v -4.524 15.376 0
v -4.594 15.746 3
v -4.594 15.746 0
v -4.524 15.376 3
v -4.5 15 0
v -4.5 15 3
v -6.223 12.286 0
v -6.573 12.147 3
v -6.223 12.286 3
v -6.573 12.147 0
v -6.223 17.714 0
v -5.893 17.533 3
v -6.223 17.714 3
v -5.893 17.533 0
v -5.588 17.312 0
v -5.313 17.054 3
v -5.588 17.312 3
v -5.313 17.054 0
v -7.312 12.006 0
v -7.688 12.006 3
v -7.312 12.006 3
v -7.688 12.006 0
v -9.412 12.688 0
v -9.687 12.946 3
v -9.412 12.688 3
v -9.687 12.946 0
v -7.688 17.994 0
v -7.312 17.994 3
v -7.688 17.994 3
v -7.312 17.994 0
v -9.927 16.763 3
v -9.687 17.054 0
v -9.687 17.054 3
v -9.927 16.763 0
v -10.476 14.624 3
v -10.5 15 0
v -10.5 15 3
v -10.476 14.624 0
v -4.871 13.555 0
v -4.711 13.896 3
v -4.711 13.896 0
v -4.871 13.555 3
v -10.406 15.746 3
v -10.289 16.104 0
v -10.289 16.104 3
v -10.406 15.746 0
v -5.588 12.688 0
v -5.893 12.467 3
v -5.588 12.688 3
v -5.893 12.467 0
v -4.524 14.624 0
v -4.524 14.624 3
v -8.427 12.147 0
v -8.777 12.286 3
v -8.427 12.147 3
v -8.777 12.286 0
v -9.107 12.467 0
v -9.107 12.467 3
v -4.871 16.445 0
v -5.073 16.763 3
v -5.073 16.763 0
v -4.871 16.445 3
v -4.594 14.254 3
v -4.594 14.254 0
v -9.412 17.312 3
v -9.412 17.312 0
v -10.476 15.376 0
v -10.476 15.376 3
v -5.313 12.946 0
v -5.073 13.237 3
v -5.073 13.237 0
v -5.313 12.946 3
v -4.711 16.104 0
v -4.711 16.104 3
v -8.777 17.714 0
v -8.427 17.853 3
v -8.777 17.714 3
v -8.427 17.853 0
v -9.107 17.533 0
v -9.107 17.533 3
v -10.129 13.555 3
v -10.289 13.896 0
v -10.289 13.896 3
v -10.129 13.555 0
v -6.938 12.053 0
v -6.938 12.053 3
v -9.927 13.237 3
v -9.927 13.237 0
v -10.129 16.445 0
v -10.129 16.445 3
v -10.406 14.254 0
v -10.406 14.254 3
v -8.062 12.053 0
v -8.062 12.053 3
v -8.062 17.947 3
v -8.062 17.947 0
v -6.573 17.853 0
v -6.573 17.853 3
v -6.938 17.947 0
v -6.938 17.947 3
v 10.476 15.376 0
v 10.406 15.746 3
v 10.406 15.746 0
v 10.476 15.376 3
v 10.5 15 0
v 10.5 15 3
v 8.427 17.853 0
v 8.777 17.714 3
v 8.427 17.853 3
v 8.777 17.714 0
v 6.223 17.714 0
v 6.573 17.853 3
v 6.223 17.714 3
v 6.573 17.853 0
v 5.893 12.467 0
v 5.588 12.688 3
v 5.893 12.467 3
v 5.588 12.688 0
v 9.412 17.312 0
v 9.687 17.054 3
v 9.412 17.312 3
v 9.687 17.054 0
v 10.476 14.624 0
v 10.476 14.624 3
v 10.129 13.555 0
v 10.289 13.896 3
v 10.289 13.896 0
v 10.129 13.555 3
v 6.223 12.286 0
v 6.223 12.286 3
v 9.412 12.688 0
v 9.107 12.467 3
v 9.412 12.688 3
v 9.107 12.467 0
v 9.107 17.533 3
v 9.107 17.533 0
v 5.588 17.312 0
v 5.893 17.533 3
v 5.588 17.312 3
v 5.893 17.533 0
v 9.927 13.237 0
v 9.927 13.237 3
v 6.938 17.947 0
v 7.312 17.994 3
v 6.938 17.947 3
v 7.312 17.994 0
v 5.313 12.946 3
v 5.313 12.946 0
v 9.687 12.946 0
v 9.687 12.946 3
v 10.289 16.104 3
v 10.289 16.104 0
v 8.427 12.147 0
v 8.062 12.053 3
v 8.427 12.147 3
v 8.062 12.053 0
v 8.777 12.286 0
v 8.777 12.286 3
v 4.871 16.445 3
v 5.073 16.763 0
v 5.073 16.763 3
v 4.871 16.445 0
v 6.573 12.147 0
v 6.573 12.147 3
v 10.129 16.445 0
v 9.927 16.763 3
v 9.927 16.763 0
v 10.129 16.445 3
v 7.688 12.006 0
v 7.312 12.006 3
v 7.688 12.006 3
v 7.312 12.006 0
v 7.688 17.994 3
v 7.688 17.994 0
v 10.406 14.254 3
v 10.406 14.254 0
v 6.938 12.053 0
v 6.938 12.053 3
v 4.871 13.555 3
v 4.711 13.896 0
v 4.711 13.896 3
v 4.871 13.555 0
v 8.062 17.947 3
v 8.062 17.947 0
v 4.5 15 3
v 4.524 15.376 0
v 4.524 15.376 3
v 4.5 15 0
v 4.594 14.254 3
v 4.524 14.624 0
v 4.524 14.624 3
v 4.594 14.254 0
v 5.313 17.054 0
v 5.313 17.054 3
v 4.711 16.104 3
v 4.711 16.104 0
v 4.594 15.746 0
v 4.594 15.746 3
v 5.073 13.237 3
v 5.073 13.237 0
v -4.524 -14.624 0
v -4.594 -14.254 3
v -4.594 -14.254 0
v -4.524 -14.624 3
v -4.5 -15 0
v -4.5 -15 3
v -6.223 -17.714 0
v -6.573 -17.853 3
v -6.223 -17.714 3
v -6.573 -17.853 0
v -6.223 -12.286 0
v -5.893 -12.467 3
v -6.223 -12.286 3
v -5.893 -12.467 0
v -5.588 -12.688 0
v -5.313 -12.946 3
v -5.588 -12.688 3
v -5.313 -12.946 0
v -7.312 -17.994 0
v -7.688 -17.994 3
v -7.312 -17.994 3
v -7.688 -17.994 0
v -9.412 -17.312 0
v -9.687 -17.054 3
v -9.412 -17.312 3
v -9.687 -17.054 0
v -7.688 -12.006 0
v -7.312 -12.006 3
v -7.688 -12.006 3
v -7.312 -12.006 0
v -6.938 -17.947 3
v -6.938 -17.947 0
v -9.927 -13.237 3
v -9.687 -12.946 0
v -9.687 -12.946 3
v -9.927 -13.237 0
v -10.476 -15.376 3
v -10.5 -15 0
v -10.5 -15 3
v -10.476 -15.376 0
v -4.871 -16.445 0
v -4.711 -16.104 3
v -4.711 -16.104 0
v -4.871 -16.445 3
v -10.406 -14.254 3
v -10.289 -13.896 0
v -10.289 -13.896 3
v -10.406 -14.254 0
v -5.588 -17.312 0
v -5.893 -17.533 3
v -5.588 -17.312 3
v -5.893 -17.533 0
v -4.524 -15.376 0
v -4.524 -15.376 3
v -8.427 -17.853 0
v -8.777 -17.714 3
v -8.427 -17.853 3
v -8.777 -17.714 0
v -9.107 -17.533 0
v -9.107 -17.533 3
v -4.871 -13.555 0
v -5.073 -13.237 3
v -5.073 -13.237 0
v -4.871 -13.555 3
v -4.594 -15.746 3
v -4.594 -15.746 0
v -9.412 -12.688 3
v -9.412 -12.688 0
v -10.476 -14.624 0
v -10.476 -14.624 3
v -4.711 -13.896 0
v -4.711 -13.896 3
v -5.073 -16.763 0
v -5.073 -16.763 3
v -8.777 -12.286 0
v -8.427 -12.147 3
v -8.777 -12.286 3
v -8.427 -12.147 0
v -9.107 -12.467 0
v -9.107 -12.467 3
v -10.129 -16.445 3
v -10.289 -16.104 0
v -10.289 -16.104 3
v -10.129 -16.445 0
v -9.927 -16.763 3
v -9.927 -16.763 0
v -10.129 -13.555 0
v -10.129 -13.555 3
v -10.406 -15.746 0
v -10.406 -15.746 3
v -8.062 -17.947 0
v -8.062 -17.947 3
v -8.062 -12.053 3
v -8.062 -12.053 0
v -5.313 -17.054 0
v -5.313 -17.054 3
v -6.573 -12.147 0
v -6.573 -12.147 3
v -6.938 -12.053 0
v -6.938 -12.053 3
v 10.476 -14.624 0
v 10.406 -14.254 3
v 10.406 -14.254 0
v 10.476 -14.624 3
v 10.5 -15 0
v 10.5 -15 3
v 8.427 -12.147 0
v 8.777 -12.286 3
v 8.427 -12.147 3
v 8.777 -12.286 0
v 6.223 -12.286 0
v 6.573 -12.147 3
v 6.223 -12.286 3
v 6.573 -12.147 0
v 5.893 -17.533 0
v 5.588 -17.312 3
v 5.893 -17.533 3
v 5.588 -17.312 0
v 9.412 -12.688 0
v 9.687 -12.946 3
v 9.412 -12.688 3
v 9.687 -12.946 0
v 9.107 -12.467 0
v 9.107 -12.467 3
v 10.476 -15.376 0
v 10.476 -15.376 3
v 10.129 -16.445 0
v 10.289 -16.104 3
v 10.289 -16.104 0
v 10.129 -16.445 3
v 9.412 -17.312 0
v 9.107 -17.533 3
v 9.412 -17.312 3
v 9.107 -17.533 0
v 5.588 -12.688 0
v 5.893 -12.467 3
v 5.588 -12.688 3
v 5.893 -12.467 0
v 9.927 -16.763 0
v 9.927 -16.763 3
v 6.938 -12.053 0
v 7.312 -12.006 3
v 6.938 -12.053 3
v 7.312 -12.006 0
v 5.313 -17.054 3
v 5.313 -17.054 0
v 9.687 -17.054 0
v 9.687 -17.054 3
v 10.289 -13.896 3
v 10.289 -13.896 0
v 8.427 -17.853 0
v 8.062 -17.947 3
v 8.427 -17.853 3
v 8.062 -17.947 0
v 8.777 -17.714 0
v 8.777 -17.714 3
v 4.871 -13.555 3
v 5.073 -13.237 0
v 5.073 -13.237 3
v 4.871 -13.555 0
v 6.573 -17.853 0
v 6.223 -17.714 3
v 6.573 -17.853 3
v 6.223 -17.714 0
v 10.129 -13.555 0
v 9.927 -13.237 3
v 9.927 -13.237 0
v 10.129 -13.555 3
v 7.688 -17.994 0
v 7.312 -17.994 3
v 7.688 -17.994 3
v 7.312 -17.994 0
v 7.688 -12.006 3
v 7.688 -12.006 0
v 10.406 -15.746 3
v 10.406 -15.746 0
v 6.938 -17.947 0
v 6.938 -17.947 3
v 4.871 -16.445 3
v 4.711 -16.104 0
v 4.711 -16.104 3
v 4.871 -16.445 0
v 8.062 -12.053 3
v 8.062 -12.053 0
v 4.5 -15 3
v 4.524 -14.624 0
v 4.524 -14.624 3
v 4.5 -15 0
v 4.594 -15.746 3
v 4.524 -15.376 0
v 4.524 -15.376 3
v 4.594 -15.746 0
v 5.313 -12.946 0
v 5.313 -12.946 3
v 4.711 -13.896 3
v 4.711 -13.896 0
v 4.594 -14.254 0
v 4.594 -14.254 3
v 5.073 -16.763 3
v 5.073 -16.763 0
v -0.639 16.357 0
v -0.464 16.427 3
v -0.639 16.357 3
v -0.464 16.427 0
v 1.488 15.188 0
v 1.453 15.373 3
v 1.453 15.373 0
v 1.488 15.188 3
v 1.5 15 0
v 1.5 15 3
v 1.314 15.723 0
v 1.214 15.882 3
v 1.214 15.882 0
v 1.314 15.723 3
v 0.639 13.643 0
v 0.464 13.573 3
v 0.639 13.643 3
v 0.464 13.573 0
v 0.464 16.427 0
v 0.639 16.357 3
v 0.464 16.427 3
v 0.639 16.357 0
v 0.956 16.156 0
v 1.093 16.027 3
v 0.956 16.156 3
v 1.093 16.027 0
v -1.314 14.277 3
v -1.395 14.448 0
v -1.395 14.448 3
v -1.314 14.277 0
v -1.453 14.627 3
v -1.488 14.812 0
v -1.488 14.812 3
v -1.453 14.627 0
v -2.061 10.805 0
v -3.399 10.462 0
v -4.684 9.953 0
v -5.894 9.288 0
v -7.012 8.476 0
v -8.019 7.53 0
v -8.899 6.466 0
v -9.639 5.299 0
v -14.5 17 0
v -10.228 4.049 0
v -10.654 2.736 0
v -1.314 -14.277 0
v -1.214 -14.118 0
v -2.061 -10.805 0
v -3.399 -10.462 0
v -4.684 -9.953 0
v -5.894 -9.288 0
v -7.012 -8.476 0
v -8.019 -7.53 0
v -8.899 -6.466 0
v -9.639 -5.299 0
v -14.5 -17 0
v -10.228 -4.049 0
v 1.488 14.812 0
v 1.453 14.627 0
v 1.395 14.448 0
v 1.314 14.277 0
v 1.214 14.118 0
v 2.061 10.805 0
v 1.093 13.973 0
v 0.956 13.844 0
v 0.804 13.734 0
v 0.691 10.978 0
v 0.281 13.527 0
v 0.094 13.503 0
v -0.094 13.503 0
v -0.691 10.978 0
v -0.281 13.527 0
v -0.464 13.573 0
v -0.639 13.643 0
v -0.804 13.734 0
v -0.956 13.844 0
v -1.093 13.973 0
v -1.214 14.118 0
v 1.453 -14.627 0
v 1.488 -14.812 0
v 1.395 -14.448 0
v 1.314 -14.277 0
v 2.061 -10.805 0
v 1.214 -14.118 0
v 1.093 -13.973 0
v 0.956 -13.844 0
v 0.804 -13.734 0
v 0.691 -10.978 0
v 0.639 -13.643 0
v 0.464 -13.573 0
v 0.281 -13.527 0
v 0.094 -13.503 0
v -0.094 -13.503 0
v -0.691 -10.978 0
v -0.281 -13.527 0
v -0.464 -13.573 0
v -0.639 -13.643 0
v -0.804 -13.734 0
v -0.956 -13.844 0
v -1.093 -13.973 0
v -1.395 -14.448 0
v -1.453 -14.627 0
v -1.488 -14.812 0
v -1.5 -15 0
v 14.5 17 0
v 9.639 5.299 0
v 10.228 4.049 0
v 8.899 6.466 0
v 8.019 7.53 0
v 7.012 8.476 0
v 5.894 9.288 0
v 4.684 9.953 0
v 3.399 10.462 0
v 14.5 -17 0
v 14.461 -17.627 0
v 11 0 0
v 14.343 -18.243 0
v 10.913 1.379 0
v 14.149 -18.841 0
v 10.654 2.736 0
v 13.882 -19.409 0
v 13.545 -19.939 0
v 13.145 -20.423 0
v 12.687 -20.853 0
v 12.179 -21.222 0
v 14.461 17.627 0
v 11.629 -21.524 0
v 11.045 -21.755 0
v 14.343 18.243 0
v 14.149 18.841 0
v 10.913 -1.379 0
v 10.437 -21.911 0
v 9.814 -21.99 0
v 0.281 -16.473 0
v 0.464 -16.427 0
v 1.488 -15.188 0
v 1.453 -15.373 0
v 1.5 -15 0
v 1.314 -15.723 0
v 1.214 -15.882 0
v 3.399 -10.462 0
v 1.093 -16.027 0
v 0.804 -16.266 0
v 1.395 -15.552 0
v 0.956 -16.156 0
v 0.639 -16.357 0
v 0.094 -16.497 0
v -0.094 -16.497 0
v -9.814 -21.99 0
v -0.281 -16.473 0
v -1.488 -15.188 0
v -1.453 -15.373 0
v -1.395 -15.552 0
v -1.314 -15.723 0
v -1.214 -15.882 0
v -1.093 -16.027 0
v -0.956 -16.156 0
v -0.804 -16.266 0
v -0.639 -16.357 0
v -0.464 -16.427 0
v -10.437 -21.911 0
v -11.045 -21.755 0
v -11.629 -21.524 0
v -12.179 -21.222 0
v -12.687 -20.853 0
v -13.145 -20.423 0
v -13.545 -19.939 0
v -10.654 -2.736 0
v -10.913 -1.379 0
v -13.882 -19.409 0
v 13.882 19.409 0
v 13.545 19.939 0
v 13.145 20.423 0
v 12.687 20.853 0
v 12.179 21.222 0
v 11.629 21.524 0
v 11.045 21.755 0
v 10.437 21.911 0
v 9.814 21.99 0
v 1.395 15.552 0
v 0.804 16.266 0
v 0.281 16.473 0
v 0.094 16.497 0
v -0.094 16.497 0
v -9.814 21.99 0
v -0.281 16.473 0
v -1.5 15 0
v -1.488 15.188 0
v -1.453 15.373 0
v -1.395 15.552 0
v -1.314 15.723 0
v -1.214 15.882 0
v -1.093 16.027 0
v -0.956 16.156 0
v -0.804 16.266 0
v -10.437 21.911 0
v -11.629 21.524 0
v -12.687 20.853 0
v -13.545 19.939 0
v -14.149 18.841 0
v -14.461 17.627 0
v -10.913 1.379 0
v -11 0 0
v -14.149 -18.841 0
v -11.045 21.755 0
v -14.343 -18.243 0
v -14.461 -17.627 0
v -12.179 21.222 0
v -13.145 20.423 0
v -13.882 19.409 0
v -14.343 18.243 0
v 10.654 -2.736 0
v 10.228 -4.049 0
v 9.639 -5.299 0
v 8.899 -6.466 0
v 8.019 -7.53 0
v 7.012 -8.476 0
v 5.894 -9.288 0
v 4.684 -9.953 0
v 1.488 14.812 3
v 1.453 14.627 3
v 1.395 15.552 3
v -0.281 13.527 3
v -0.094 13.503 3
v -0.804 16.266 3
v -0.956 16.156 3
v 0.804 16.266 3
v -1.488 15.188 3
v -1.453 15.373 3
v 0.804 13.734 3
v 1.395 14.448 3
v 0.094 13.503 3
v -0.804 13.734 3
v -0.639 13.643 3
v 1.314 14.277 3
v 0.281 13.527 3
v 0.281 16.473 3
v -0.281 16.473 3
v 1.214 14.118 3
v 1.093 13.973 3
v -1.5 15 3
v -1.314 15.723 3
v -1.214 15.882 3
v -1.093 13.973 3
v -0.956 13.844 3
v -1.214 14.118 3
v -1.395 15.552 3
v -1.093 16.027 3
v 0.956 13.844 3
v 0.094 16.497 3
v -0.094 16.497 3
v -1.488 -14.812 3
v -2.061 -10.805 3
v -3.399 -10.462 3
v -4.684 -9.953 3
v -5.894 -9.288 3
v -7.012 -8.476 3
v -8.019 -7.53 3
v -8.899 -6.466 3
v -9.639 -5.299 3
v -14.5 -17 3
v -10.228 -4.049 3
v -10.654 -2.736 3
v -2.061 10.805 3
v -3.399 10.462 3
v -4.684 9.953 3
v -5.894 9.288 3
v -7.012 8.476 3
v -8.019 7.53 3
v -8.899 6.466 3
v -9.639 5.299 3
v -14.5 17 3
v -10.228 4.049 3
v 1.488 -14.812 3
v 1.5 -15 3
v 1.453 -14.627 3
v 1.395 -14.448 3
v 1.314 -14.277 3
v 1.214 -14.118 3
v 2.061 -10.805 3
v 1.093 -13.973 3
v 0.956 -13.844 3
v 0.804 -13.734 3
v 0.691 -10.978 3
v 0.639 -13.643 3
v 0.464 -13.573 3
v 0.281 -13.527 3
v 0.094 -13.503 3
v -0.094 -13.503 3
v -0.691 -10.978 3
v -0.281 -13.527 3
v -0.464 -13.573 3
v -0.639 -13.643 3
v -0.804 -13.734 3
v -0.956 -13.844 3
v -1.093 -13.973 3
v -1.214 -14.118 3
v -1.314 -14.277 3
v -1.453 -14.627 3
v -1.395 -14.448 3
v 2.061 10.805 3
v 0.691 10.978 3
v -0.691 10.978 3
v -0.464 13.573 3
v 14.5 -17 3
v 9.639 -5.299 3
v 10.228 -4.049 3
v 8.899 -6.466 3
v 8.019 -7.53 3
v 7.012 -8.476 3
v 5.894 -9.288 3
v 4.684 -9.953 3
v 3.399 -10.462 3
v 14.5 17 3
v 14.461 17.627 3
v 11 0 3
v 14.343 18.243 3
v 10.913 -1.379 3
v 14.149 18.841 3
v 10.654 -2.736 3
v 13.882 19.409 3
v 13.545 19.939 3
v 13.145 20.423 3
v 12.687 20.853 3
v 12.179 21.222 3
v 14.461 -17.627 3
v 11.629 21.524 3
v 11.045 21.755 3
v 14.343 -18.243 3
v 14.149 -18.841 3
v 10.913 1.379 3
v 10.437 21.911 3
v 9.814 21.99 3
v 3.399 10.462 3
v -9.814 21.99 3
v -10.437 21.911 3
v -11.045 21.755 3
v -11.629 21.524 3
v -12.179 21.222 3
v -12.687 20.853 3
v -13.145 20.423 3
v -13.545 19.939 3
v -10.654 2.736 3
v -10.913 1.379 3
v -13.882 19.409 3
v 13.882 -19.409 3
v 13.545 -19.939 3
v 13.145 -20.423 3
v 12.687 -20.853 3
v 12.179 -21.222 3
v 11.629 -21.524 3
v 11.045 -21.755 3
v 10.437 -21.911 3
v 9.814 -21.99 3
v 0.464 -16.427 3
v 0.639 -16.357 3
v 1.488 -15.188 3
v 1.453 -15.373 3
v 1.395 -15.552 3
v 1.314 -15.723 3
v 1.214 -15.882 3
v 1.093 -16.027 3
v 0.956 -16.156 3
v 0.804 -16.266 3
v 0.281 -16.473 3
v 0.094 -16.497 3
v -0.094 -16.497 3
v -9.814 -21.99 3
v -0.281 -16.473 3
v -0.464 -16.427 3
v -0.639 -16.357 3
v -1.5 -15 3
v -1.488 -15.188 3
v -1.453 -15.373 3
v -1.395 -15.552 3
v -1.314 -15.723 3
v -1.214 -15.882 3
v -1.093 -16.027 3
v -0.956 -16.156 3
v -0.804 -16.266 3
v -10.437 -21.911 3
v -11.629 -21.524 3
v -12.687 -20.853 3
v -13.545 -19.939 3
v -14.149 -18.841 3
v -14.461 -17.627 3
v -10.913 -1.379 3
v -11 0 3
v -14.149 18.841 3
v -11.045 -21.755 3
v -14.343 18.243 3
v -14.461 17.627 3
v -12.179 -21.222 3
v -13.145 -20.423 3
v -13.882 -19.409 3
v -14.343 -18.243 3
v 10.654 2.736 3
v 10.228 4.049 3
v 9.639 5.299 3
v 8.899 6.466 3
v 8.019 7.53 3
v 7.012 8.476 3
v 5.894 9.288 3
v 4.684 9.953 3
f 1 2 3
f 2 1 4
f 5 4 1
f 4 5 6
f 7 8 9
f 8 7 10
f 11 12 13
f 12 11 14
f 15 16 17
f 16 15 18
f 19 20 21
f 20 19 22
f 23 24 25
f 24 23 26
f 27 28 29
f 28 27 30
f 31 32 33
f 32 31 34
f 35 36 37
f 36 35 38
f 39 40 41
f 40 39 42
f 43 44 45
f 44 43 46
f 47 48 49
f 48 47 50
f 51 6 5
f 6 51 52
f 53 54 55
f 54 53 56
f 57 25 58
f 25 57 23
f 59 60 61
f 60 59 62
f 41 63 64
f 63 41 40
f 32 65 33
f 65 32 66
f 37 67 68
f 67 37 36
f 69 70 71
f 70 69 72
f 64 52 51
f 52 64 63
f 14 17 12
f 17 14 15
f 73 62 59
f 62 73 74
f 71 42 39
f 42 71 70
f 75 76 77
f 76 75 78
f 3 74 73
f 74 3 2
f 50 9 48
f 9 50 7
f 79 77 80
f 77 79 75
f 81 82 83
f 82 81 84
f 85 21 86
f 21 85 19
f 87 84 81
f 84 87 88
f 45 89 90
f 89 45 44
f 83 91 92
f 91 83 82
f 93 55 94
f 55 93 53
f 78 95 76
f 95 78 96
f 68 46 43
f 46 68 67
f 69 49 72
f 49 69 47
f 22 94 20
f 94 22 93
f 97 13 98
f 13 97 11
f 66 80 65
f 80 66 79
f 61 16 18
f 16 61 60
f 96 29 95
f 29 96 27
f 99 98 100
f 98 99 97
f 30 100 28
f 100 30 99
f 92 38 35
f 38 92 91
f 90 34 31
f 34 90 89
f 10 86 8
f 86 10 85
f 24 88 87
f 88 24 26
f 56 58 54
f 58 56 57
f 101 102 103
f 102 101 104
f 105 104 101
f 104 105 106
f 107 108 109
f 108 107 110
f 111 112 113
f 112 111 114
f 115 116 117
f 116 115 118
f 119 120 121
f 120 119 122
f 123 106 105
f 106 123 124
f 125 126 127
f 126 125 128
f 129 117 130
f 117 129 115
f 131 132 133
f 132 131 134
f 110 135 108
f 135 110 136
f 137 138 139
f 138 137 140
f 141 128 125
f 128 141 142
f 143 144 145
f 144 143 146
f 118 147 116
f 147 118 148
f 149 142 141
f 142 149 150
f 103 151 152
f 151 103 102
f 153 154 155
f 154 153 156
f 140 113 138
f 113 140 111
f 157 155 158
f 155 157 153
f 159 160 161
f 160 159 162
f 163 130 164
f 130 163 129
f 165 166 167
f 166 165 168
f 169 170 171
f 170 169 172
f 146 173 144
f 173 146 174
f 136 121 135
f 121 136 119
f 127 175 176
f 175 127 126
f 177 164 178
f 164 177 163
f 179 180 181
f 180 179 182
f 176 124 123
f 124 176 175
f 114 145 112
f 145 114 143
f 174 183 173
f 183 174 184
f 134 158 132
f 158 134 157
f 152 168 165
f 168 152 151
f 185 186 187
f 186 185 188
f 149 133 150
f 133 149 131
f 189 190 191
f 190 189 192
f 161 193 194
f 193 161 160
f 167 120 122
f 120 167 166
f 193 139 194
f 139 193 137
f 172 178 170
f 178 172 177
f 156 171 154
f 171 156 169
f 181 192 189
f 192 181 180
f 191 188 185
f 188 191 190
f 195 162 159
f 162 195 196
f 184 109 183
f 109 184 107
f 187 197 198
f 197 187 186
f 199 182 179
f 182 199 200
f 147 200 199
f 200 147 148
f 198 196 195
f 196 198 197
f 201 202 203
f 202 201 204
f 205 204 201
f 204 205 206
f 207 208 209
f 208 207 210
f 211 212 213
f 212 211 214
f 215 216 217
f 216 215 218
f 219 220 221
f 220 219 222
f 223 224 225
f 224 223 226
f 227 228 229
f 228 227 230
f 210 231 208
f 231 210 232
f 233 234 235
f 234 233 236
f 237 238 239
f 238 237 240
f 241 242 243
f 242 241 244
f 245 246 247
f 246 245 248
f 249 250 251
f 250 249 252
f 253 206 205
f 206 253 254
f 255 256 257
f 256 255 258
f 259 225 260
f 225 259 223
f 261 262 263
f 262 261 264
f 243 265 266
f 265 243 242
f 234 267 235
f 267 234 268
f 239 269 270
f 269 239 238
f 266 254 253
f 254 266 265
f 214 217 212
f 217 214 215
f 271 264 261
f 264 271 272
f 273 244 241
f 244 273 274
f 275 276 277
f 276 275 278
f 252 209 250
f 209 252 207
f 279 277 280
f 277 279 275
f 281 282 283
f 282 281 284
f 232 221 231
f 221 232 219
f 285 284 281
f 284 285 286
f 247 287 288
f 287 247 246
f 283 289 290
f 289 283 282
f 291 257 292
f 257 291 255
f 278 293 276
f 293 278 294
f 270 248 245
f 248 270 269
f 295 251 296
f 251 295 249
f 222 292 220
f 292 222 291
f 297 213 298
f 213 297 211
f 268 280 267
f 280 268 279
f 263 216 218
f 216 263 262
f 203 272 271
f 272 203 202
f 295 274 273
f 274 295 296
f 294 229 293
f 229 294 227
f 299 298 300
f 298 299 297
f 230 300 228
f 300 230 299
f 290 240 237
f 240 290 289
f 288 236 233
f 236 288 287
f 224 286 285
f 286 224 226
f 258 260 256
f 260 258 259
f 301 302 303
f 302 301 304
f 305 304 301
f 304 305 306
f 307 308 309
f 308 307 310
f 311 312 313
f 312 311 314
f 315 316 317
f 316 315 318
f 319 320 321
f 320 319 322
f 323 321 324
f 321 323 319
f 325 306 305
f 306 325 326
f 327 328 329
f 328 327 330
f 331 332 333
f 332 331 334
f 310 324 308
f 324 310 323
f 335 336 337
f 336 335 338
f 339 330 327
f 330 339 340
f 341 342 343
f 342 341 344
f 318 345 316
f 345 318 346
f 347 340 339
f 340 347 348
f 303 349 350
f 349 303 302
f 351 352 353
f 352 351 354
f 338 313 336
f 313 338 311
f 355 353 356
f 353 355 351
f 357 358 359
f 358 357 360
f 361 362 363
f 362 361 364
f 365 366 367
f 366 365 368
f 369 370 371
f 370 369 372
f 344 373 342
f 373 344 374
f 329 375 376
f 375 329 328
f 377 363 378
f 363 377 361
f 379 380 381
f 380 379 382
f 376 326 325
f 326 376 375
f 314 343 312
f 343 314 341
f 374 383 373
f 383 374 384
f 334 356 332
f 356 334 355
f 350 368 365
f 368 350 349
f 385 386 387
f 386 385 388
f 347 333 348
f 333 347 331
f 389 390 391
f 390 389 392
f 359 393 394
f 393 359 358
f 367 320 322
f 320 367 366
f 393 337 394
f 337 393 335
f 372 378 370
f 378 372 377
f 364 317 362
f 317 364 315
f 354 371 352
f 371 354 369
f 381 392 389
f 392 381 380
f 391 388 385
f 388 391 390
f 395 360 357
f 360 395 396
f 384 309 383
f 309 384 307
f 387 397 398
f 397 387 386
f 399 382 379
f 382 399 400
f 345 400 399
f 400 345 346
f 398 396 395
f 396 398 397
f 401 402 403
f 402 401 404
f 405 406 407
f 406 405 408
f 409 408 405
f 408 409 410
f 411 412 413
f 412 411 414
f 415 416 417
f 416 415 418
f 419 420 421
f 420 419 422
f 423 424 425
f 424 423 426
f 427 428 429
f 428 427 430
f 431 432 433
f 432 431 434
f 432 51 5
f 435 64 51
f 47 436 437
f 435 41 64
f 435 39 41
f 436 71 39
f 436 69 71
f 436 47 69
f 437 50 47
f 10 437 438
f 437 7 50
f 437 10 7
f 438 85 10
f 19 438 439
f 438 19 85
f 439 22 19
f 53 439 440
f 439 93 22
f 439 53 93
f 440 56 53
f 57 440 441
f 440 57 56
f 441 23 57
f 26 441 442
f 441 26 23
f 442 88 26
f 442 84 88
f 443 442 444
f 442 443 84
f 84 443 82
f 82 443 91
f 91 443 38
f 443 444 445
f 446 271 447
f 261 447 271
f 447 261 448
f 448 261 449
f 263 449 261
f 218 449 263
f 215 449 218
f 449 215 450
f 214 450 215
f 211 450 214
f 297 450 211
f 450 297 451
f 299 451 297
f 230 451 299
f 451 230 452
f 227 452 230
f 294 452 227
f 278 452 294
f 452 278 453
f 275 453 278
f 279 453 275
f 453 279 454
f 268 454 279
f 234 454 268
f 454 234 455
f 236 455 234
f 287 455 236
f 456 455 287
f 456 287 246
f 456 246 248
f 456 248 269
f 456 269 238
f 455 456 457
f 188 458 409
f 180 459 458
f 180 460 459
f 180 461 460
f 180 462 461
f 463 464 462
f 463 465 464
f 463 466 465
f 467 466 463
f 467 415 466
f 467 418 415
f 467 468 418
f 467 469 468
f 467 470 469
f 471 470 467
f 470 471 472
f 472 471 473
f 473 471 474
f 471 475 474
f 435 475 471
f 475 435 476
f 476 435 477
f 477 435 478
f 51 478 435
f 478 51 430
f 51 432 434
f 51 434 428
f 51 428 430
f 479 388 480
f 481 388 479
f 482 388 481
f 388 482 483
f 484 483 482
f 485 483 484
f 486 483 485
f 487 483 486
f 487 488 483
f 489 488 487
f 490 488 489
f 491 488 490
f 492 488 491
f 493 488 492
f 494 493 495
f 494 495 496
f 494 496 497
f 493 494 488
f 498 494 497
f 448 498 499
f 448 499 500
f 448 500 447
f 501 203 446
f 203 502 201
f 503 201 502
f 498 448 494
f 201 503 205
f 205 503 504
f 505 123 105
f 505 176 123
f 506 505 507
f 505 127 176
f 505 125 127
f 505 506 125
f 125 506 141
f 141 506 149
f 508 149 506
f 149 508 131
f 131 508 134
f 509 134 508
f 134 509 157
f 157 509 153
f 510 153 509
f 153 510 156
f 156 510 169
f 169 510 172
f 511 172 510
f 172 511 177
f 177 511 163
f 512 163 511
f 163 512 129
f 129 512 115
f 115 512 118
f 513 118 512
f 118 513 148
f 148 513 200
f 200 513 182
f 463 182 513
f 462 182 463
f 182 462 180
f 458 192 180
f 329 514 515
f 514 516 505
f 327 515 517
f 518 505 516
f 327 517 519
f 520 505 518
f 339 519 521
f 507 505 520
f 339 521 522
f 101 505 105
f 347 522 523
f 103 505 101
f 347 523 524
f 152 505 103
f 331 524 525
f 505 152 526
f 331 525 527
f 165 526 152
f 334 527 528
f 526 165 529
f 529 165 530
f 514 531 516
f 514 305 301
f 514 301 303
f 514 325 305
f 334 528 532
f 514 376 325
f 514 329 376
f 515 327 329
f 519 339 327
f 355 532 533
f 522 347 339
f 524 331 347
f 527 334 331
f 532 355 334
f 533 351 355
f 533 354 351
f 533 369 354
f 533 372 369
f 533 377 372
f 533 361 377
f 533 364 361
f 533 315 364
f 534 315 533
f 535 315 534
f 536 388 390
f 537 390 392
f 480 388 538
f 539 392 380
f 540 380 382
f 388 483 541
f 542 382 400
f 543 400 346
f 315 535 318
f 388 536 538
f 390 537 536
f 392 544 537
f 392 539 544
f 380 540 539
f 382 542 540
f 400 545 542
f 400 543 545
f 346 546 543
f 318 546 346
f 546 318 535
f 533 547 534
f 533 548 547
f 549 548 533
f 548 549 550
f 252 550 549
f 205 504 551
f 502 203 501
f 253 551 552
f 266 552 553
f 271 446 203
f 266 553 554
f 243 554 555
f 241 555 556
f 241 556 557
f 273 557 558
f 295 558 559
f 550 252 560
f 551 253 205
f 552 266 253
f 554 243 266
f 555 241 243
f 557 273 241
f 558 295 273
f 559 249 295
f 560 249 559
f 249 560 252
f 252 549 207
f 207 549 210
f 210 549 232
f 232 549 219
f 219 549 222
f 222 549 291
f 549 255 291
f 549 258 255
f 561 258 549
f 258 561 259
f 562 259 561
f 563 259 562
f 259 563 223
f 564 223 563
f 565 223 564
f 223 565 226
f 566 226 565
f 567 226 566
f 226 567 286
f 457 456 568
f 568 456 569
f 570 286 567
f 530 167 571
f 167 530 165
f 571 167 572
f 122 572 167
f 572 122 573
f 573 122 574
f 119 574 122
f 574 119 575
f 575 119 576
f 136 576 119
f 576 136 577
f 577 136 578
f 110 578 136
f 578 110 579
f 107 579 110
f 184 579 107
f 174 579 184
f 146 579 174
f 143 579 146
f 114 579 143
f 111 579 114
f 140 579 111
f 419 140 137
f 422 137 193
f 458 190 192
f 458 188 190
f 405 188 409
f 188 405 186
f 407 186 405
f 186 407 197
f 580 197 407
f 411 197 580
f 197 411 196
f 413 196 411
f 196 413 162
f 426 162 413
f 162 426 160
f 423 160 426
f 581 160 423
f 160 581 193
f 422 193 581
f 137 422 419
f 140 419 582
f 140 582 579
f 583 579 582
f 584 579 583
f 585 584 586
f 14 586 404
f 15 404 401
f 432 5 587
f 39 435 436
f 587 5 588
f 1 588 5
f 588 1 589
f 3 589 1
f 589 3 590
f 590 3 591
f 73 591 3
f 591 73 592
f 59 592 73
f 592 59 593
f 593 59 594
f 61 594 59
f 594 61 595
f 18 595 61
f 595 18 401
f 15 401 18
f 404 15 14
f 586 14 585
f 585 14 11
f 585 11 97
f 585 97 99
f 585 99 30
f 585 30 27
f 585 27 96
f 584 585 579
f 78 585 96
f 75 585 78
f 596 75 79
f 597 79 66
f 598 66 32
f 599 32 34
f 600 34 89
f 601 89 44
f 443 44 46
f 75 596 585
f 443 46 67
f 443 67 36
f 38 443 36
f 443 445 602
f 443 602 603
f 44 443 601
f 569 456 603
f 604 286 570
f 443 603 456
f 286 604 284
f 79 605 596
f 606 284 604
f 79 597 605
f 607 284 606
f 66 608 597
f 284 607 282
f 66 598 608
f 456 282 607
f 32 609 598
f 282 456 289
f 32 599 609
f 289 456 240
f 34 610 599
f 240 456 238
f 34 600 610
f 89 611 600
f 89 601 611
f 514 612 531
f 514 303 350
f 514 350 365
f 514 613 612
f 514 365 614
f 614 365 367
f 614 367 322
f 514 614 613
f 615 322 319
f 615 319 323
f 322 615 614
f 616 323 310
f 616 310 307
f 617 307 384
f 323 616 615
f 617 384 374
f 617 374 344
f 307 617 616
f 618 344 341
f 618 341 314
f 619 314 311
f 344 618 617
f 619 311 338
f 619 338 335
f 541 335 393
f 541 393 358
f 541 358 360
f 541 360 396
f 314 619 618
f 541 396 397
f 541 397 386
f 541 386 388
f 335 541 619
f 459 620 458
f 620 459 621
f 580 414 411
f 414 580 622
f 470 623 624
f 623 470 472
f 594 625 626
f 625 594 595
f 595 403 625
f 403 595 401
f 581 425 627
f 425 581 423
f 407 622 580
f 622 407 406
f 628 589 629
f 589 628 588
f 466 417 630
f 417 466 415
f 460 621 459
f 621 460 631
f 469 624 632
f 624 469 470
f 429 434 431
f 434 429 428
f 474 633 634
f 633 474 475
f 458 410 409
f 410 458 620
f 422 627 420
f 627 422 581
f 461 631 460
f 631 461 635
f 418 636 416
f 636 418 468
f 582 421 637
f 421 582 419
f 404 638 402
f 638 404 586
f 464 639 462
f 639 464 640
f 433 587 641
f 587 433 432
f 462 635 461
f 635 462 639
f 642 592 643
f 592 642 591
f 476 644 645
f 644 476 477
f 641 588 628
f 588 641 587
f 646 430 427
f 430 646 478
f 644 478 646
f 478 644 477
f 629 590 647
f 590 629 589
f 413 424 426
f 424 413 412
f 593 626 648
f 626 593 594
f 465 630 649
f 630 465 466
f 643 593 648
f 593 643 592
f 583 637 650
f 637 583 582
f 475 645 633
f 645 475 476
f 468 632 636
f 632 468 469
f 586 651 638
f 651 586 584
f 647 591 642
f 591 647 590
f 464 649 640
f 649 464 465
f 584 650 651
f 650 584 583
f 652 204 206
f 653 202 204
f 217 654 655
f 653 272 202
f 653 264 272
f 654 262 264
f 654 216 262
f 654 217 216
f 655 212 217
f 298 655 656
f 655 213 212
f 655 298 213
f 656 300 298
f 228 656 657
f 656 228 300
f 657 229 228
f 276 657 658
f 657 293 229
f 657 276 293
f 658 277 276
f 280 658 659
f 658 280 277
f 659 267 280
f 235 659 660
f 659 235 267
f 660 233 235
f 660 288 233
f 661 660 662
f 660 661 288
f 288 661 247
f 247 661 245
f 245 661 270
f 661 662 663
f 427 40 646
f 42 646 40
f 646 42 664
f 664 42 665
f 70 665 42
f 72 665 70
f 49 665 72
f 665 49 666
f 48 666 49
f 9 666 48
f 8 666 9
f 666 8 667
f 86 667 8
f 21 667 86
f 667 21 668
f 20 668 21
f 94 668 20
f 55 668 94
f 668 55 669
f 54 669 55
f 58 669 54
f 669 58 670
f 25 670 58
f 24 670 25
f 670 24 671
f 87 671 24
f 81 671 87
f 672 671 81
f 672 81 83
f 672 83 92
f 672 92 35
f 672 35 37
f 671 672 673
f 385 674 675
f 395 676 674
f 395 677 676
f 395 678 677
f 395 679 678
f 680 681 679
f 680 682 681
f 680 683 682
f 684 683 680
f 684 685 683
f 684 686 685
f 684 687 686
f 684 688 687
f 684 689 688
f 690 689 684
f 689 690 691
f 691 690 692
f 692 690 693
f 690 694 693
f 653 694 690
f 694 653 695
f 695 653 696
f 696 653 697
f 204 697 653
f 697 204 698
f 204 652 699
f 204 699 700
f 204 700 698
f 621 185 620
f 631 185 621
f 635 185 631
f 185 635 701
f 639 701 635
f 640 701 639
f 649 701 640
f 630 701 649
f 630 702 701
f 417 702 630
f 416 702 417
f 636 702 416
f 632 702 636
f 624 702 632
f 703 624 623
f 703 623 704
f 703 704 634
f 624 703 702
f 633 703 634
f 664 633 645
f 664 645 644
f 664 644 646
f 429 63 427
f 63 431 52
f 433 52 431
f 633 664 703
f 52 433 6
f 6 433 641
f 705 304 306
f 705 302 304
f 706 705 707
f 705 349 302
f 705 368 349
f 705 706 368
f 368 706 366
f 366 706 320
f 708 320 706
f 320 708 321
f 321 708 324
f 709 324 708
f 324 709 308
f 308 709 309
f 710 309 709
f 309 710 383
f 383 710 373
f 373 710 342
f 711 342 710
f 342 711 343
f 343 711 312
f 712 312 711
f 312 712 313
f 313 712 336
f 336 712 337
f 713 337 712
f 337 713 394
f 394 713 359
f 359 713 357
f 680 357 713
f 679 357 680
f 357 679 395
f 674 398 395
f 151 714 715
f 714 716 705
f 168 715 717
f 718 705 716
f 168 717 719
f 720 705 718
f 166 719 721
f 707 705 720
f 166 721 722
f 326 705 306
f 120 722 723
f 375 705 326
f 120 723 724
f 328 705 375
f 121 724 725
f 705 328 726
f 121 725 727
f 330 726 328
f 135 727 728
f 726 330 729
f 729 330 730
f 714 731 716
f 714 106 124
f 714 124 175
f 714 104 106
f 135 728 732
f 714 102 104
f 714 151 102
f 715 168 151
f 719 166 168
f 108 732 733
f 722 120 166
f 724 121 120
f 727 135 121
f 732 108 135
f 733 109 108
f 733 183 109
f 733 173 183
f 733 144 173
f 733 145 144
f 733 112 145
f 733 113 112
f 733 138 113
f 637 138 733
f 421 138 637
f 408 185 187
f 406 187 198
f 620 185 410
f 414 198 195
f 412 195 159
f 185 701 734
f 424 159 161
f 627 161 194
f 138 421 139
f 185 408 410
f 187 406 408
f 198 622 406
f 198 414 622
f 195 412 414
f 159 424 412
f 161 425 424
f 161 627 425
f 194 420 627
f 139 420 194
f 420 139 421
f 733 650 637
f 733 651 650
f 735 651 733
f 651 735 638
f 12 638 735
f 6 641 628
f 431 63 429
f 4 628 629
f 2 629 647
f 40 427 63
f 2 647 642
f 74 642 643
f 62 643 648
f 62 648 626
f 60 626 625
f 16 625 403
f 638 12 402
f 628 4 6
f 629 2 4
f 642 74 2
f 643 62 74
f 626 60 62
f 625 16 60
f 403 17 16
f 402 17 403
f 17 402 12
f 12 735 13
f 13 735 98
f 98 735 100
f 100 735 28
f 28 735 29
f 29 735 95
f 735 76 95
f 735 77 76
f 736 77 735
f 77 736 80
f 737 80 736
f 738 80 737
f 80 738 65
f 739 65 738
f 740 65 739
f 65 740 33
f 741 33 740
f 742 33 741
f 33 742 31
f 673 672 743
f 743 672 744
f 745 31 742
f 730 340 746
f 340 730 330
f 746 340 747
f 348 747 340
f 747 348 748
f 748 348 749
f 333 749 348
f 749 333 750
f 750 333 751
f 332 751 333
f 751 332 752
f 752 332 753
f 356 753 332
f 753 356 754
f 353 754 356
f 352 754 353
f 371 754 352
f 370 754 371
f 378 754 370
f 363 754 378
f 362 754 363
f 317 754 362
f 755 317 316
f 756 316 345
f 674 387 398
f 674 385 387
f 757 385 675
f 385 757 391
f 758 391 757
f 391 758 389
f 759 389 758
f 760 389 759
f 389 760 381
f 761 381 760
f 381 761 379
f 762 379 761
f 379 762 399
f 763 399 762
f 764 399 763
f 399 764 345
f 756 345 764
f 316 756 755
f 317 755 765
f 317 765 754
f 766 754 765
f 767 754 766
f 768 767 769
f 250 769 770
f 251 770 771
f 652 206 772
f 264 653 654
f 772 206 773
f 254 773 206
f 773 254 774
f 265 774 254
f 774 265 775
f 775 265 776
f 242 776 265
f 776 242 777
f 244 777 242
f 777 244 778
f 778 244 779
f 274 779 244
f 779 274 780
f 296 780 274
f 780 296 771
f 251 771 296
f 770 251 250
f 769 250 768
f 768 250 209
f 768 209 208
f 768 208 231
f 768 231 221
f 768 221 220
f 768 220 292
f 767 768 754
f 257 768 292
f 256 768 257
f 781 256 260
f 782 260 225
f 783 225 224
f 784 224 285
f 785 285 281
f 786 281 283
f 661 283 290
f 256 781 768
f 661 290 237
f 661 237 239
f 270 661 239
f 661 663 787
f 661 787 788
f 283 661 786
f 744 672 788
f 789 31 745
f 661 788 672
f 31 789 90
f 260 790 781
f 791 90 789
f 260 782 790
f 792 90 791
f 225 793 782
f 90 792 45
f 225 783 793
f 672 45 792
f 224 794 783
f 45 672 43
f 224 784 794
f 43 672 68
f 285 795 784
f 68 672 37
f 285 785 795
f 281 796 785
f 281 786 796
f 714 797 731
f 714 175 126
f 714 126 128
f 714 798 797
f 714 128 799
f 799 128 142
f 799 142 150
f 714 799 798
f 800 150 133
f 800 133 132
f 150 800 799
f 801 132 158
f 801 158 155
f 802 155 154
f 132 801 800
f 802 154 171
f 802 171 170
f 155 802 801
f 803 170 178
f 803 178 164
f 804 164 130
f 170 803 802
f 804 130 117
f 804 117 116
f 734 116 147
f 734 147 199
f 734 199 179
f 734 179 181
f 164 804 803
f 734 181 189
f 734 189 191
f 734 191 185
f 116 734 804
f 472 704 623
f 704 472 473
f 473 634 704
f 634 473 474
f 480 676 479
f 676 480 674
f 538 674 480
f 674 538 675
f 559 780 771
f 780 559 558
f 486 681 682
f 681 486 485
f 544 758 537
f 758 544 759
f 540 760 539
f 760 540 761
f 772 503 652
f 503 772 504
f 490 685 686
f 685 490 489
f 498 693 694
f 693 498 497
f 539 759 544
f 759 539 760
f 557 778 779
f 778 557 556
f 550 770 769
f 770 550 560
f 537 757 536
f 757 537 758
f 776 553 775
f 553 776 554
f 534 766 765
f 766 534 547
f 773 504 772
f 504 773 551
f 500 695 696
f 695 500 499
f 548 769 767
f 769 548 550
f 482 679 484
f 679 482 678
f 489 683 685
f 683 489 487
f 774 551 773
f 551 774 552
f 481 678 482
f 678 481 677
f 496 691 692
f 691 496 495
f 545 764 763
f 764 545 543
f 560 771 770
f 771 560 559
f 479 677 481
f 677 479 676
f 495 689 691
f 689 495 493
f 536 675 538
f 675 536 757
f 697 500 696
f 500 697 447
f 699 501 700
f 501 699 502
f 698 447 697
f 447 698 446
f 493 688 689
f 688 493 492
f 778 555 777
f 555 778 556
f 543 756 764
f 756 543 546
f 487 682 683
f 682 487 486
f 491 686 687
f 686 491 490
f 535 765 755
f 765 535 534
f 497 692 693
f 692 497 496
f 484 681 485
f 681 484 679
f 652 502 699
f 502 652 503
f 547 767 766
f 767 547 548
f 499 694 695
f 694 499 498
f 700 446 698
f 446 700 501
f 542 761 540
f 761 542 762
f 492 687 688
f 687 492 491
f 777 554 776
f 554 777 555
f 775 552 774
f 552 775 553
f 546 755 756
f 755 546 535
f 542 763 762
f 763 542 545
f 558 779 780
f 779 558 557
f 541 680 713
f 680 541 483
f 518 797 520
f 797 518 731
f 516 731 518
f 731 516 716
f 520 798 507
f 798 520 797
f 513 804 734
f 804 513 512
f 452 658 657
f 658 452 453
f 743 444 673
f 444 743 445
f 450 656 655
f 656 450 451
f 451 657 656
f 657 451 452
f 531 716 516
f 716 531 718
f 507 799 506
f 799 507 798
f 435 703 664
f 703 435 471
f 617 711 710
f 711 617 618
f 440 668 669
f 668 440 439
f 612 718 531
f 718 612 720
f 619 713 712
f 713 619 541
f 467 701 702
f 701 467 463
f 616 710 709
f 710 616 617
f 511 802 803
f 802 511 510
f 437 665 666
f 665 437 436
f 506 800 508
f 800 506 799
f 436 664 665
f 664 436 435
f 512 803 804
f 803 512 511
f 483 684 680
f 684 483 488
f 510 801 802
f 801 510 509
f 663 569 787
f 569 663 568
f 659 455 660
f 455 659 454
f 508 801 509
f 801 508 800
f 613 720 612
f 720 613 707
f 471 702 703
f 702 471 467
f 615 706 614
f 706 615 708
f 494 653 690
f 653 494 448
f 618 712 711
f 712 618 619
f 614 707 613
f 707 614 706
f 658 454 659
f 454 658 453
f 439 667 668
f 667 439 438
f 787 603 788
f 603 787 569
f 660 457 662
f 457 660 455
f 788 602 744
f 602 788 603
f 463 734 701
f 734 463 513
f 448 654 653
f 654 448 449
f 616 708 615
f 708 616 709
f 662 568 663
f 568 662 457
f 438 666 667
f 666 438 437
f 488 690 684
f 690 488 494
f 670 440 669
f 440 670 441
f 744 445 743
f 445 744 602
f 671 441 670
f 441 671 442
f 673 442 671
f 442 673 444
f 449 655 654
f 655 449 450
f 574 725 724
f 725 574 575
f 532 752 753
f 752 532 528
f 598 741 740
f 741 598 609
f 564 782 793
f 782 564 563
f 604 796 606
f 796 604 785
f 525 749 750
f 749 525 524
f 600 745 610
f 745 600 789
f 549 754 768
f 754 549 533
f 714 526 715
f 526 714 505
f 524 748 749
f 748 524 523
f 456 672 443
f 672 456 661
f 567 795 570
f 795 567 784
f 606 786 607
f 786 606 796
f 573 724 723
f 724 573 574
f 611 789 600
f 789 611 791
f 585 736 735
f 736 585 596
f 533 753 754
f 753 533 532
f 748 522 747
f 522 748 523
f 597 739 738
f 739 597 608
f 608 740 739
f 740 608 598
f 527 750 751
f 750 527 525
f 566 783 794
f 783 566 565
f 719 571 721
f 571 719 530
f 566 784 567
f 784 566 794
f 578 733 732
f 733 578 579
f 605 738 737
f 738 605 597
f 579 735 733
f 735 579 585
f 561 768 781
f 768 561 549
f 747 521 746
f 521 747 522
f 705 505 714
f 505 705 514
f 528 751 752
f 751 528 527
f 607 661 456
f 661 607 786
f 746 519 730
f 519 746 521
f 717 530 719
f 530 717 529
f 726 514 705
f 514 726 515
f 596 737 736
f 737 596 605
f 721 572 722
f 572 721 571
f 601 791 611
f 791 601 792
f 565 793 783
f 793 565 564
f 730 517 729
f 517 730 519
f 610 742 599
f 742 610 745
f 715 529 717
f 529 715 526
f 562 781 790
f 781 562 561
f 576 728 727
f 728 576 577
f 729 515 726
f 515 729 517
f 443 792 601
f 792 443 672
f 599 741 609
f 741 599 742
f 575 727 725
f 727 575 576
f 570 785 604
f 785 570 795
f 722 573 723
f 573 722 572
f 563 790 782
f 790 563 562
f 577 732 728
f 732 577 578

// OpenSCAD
$fn = 50;


difference() {
	union() {
		hull() {
			translate(v = [-9.5000000000, 17.0000000000, 0]) {
				cylinder(h = 3, r = 5);
			}
			translate(v = [9.5000000000, 17.0000000000, 0]) {
				cylinder(h = 3, r = 5);
			}
			translate(v = [-9.5000000000, -17.0000000000, 0]) {
				cylinder(h = 3, r = 5);
			}
			translate(v = [9.5000000000, -17.0000000000, 0]) {
				cylinder(h = 3, r = 5);
			}
		}
	}
	union() {
		#translate(v = [-7.5000000000, 15.0000000000, 0]) {
			cylinder(h = 3, r = 3.0000000000);
		}
		#translate(v = [7.5000000000, 15.0000000000, 0]) {
			cylinder(h = 3, r = 3.0000000000);
		}
		#translate(v = [-7.5000000000, -15.0000000000, 0]) {
			cylinder(h = 3, r = 3.0000000000);
		}
		#translate(v = [7.5000000000, -15.0000000000, 0]) {
			cylinder(h = 3, r = 3.0000000000);
		}
		#translate(v = [-7.5000000000, -15.0000000000, -100.0000000000]) {
			cylinder(h = 200, r = 3.0000000000);
		}
		#translate(v = [-7.5000000000, 15.0000000000, -100.0000000000]) {
			cylinder(h = 200, r = 3.0000000000);
		}
		#translate(v = [7.5000000000, -15.0000000000, -100.0000000000]) {
			cylinder(h = 200, r = 3.0000000000);
		}
		#translate(v = [7.5000000000, 15.0000000000, -100.0000000000]) {
			cylinder(h = 200, r = 3.0000000000);
		}
		#translate(v = [-7.5000000000, 15.0000000000, 0]) {
			cylinder(h = 3, r = 1.5000000000);
		}
		#translate(v = [0.0000000000, 15.0000000000, 0]) {
			cylinder(h = 3, r = 1.5000000000);
		}
		#translate(v = [7.5000000000, 15.0000000000, 0]) {
			cylinder(h = 3, r = 1.5000000000);
		}
		#translate(v = [-7.5000000000, -15.0000000000, 0]) {
			cylinder(h = 3, r = 1.5000000000);
		}
		#translate(v = [0.0000000000, -15.0000000000, 0]) {
			cylinder(h = 3, r = 1.5000000000);
		}
		#translate(v = [7.5000000000, -15.0000000000, 0]) {
			cylinder(h = 3, r = 1.5000000000);
		}
		#translate(v = [-7.5000000000, 15.0000000000, 0]) {
			cylinder(h = 3, r = 1.5000000000);
		}
		#translate(v = [0.0000000000, 15.0000000000, 0]) {
			cylinder(h = 3, r = 1.5000000000);
		}
		#translate(v = [7.5000000000, 15.0000000000, 0]) {
			cylinder(h = 3, r = 1.5000000000);
		}
		#translate(v = [-7.5000000000, -15.0000000000, 0]) {
			cylinder(h = 3, r = 1.5000000000);
		}
		#translate(v = [0.0000000000, -15.0000000000, 0]) {
			cylinder(h = 3, r = 1.5000000000);
		}
		#translate(v = [7.5000000000, -15.0000000000, 0]) {
			cylinder(h = 3, r = 1.5000000000);
		}
		#translate(v = [-7.5000000000, 15.0000000000, 0]) {
			cylinder(h = 3, r = 1.5000000000);
		}
		#translate(v = [0.0000000000, 15.0000000000, 0]) {
			cylinder(h = 3, r = 1.5000000000);
		}
		#translate(v = [7.5000000000, 15.0000000000, 0]) {
			cylinder(h = 3, r = 1.5000000000);
		}
		#translate(v = [-7.5000000000, -15.0000000000, 0]) {
			cylinder(h = 3, r = 1.5000000000);
		}
		#translate(v = [0.0000000000, -15.0000000000, 0]) {
			cylinder(h = 3, r = 1.5000000000);
		}
		#translate(v = [7.5000000000, -15.0000000000, 0]) {
			cylinder(h = 3, r = 1.5000000000);
		}
		#cylinder(h = 3, r = 11.0000000000);
	}
}
